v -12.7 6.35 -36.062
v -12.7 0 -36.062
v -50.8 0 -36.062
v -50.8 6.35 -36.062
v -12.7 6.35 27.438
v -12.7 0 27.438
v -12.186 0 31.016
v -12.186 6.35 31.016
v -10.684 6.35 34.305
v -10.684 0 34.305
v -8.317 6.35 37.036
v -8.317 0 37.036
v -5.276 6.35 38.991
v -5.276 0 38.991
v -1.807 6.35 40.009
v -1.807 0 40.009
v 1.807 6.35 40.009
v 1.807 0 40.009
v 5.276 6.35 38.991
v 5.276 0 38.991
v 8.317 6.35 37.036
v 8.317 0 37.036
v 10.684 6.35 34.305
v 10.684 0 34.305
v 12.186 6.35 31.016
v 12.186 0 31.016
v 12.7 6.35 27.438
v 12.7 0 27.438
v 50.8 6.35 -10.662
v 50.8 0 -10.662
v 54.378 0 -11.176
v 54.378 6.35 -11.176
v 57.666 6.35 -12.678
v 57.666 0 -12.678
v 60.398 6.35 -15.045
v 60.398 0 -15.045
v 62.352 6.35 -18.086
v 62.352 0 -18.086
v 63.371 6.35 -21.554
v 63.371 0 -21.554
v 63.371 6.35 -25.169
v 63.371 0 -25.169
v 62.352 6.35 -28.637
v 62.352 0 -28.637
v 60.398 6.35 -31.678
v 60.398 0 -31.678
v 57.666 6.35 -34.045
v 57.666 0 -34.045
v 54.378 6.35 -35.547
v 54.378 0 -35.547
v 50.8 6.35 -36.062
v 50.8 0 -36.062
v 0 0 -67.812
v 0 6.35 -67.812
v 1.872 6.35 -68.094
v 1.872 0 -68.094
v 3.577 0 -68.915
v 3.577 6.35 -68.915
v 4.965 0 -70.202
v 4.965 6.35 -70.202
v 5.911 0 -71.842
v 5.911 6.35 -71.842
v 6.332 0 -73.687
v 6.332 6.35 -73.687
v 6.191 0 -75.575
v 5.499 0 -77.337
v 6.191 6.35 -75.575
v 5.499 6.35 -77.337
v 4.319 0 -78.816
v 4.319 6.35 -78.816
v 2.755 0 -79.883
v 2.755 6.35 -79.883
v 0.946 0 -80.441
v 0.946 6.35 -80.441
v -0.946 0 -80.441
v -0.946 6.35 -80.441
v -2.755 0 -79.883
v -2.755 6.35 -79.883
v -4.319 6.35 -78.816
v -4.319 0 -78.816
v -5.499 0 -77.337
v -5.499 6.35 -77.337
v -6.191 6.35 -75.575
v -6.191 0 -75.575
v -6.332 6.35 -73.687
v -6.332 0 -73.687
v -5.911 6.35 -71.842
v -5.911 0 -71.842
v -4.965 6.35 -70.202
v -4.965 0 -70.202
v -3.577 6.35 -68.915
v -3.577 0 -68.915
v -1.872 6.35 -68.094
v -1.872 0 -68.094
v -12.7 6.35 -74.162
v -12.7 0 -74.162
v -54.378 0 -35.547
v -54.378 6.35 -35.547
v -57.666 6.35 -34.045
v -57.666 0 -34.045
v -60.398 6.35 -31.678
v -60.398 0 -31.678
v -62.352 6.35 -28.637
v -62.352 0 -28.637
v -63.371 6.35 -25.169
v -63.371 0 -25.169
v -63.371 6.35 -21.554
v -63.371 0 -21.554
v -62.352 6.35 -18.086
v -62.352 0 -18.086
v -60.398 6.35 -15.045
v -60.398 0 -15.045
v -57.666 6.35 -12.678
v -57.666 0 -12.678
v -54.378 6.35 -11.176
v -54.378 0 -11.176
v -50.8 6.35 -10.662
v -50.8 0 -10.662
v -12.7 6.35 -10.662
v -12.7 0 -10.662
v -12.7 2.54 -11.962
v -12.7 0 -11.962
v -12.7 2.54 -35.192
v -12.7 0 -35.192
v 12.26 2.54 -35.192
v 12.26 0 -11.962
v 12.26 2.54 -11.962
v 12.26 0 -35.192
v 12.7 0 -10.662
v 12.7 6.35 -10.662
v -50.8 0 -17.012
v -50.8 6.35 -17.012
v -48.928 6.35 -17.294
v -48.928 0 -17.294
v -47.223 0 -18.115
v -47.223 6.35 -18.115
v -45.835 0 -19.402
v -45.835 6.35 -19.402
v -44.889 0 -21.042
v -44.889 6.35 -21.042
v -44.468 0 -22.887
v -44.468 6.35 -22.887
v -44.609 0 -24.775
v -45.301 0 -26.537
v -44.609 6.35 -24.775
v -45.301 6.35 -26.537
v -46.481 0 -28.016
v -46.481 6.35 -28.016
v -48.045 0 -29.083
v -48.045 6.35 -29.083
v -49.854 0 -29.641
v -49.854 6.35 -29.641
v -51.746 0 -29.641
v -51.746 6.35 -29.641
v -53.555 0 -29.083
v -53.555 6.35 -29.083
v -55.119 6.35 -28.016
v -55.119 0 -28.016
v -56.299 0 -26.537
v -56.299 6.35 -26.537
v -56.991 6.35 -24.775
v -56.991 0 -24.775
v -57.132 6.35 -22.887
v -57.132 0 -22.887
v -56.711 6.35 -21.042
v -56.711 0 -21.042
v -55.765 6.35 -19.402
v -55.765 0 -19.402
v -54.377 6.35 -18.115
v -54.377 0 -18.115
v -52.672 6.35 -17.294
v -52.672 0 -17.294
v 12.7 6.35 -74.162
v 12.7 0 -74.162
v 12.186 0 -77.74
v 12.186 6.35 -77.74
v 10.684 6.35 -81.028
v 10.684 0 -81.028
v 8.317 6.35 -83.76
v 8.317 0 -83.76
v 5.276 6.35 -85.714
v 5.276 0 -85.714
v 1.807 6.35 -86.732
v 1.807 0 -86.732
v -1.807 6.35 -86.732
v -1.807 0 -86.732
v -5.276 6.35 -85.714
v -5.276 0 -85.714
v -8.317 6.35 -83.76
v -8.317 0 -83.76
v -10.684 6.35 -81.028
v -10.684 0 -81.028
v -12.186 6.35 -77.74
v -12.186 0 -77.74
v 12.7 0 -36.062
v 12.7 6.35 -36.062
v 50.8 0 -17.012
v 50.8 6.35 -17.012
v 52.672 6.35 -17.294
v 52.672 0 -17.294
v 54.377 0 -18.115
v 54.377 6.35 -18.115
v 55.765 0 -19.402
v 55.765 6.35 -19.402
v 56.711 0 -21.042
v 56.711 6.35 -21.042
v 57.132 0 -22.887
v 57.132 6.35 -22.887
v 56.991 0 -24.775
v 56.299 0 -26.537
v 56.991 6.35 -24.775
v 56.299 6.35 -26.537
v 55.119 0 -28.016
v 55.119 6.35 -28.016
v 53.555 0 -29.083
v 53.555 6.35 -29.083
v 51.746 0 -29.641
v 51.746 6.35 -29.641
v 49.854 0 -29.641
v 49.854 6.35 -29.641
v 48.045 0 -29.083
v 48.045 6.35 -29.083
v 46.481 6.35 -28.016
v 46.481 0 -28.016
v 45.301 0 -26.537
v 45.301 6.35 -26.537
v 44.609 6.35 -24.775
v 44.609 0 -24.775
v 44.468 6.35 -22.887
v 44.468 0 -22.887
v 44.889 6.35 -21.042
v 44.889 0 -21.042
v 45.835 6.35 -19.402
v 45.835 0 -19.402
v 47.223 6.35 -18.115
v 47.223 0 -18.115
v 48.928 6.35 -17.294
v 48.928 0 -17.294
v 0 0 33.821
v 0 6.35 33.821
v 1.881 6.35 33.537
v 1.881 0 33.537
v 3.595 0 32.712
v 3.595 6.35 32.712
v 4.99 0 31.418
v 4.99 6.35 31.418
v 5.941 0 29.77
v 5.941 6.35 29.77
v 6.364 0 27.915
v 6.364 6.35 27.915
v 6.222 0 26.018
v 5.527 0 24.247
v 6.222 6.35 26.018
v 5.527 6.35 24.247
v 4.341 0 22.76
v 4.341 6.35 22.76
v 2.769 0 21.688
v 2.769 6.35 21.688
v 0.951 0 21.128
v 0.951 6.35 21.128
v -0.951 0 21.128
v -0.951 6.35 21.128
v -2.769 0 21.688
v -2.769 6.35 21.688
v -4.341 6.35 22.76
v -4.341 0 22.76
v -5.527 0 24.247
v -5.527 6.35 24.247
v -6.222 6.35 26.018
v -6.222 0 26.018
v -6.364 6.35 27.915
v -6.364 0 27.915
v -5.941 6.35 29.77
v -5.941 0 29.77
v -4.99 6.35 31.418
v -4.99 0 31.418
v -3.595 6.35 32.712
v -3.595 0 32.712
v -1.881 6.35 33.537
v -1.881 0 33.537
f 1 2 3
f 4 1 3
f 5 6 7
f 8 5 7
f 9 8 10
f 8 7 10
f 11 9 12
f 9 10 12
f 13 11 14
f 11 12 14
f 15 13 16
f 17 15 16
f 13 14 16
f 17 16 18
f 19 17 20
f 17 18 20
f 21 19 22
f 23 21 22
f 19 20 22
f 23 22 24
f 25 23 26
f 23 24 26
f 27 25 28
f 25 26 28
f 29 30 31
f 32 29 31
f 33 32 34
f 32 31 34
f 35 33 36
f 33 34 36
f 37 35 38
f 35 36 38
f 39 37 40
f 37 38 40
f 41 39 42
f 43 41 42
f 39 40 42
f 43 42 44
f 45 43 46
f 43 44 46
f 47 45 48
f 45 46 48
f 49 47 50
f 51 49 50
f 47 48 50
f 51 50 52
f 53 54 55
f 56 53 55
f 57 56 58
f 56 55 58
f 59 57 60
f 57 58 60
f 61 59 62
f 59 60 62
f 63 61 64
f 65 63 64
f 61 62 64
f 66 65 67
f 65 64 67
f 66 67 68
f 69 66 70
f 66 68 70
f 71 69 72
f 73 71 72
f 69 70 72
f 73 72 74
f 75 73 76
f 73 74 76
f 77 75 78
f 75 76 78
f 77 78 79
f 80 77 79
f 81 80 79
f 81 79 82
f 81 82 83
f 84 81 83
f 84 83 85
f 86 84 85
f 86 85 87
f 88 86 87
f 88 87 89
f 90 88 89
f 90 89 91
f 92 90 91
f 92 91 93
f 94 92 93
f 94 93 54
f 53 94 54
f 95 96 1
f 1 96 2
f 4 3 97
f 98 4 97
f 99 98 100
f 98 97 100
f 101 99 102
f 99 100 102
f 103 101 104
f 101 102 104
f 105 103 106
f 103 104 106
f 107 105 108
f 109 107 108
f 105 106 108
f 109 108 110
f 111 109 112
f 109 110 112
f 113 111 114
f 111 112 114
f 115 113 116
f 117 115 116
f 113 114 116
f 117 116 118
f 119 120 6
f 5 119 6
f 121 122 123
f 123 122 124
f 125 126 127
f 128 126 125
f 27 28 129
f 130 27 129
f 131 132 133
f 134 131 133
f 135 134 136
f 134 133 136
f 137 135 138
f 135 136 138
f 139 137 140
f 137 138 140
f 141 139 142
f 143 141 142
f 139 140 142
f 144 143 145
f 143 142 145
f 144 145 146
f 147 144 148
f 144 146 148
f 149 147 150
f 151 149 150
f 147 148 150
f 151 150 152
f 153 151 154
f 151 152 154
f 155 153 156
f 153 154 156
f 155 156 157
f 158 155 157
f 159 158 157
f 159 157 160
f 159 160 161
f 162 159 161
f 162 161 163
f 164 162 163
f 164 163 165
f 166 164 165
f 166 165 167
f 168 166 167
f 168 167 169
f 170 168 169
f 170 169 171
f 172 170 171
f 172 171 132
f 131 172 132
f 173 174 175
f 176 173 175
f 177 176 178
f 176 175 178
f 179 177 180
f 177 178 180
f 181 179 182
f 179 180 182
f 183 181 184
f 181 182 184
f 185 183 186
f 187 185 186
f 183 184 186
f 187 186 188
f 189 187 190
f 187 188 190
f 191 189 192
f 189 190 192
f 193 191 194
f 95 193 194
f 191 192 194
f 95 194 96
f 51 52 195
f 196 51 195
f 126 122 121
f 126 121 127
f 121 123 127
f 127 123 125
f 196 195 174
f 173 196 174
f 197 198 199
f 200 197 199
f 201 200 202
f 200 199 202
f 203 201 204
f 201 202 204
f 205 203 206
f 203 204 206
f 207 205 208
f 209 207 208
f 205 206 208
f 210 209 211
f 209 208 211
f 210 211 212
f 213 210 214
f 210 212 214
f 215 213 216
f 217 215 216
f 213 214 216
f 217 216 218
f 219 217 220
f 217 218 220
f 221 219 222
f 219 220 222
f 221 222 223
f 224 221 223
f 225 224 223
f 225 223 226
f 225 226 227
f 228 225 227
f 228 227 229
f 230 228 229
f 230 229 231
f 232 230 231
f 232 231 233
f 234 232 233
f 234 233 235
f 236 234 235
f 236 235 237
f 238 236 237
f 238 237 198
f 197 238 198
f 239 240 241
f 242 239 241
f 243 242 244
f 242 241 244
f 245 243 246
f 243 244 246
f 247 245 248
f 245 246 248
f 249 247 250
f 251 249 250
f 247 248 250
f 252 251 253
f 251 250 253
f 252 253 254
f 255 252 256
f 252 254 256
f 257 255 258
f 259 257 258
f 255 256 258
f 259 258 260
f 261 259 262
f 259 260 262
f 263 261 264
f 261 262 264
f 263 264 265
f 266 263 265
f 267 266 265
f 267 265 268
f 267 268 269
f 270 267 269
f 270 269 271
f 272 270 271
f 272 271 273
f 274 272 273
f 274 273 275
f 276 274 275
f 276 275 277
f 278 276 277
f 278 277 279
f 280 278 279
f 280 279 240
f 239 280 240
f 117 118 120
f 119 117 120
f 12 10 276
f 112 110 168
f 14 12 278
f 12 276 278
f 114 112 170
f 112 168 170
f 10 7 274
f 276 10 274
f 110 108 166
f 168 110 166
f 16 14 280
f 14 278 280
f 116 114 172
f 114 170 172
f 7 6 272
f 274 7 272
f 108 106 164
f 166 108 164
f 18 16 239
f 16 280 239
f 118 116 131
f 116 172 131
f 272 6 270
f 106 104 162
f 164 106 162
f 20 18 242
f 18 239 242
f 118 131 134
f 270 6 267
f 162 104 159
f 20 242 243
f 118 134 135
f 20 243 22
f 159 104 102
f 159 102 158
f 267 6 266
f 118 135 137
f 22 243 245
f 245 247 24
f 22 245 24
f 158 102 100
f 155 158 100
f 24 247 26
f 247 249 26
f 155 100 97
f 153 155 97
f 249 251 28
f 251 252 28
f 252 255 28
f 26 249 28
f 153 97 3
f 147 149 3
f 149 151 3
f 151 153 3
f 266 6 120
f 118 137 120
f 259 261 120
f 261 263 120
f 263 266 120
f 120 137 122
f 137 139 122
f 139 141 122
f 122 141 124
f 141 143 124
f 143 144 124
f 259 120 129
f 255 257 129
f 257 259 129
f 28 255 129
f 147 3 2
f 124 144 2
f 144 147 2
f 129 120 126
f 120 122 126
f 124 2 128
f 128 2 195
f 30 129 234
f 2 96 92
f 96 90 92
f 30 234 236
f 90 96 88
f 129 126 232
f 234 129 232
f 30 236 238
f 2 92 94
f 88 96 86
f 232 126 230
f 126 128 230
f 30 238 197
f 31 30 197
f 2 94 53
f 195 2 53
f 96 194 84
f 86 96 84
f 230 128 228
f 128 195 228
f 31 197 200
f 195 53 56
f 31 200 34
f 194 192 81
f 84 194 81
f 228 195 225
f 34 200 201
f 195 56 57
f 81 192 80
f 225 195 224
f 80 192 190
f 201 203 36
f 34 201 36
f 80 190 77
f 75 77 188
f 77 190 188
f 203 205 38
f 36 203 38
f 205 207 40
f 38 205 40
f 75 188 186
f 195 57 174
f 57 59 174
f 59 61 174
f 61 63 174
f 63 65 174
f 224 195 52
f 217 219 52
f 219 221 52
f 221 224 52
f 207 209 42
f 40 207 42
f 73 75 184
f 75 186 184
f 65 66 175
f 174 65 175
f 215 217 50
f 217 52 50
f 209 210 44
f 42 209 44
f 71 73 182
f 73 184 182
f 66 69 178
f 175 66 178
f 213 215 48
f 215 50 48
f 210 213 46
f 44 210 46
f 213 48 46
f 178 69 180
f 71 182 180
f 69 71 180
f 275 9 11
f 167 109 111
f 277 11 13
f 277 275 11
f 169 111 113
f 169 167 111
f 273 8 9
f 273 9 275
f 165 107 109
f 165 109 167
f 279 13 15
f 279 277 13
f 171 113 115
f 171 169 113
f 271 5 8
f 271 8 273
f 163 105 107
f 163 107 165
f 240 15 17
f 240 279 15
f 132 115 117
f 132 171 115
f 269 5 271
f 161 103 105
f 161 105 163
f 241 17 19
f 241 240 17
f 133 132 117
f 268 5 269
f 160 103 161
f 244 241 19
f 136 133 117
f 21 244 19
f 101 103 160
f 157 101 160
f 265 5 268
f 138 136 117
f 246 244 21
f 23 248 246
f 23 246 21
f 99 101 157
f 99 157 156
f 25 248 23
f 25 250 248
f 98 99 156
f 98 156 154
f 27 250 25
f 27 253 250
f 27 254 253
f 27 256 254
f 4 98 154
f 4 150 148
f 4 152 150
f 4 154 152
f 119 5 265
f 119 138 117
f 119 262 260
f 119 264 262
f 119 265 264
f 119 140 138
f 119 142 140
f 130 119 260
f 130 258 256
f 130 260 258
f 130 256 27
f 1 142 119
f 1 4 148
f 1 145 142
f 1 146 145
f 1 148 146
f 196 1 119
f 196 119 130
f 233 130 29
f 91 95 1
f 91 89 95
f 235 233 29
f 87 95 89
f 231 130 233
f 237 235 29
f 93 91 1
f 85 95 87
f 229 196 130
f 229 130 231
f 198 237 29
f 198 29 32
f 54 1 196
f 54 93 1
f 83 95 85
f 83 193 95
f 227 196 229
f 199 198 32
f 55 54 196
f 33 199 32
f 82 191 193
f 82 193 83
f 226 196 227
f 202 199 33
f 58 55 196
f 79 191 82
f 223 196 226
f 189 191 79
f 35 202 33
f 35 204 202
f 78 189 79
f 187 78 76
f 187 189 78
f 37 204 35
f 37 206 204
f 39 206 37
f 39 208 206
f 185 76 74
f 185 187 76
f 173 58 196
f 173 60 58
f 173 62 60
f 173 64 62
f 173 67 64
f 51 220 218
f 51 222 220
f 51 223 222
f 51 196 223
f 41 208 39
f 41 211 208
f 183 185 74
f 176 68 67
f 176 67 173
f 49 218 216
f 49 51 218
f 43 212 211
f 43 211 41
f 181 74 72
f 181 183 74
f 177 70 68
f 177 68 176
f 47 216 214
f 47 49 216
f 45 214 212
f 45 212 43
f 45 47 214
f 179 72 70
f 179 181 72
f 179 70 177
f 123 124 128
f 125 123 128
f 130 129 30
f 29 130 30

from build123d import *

# Parameters (mm, degrees)
SKETCH1_W           = 25.4
SKETCH1_H           = 25.4
BOSS_EXTRUDE1_DEPTH = 6.35
SKETCH2_R           = 6.35
SKETCH2_R_2         = 6.382099354
CUT_EXTRUDE1_DEPTH  = 108.784518461
SKETCH3_W           = 24.960329338
SKETCH3_H           = 23.230097692
CUT_EXTRUDE2_DEPTH  = 2.54


with BuildPart() as part:
    # Sketch1 → Boss-Extrude1 (new body)
    with BuildSketch(Plane(origin=(0, 0, 0), x_dir=(1, 0, 0), z_dir=(0, 1, 0))):
        with BuildLine():
            Line((12.7, 36.061556053), (12.7, 74.161556053))
            ThreePointArc((12.7, 74.161556053), (0, 86.861556053), (-12.7, 74.161556053))
            Line((-12.7, 74.161556053), (-12.7, 36.061556053))
            Line((-12.7, 36.061556053), (12.7, 36.061556053))
        make_face()
        with BuildLine():
            Line((50.8, 36.061556053), (12.7, 36.061556053))
            Line((12.7, 36.061556053), (12.7, 10.661556053))
            Line((12.7, 10.661556053), (50.8, 10.661556053))
            ThreePointArc((50.8, 10.661556053), (63.5, 23.361556053), (50.8, 36.061556053))
        make_face()
        with BuildLine():
            Line((12.7, -27.438443947), (12.7, 10.661556053))
            Line((12.7, 10.661556053), (-12.7, 10.661556053))
            Line((-12.7, 10.661556053), (-12.7, -27.438443947))
            ThreePointArc((-12.7, -27.438443947), (0, -40.138443947), (12.7, -27.438443947))
        make_face()
        with BuildLine():
            Line((-12.7, 10.661556053), (-12.7, 36.061556053))
            Line((-12.7, 36.061556053), (-50.8, 36.061556053))
            ThreePointArc((-50.8, 36.061556053), (-63.5, 23.361556053), (-50.8, 10.661556053))
            Line((-50.8, 10.661556053), (-12.7, 10.661556053))
        make_face()
        with Locations((0, 23.361556053)):
            Rectangle(SKETCH1_W, SKETCH1_H)
    extrude(amount=BOSS_EXTRUDE1_DEPTH)

    # Sketch2 → Cut-Extrude1 (cut, through all)
    with BuildSketch(Plane(origin=(0, 6.35, 0), x_dir=(1, 0, 0), z_dir=(0, 1, 0))):
        with Locations(Location((0, 74.161556053, 0), (0, 0, 270))):
            Circle(SKETCH2_R)
        with Locations(Location((-50.8, 23.361556053, 0), (0, 0, 270))):
            Circle(SKETCH2_R)
        with Locations(Location((0, -27.438443947, 0), (0, 0, 270))):
            Circle(SKETCH2_R_2)
        with Locations(Location((50.8, 23.361556053, 0), (0, 0, 270))):
            Circle(SKETCH2_R)
    extrude(amount=-CUT_EXTRUDE1_DEPTH, mode=Mode.SUBTRACT)

    # Sketch3 → Cut-Extrude2 (cut)
    with BuildSketch(Plane(origin=(0, 0, 0), x_dir=(1, 0, 0), z_dir=(0, 1, 0))):
        with Locations((-0.219835331, 23.57664955)):
            Rectangle(SKETCH3_W, SKETCH3_H)
    extrude(amount=CUT_EXTRUDE2_DEPTH, mode=Mode.SUBTRACT)


solid = part.part
